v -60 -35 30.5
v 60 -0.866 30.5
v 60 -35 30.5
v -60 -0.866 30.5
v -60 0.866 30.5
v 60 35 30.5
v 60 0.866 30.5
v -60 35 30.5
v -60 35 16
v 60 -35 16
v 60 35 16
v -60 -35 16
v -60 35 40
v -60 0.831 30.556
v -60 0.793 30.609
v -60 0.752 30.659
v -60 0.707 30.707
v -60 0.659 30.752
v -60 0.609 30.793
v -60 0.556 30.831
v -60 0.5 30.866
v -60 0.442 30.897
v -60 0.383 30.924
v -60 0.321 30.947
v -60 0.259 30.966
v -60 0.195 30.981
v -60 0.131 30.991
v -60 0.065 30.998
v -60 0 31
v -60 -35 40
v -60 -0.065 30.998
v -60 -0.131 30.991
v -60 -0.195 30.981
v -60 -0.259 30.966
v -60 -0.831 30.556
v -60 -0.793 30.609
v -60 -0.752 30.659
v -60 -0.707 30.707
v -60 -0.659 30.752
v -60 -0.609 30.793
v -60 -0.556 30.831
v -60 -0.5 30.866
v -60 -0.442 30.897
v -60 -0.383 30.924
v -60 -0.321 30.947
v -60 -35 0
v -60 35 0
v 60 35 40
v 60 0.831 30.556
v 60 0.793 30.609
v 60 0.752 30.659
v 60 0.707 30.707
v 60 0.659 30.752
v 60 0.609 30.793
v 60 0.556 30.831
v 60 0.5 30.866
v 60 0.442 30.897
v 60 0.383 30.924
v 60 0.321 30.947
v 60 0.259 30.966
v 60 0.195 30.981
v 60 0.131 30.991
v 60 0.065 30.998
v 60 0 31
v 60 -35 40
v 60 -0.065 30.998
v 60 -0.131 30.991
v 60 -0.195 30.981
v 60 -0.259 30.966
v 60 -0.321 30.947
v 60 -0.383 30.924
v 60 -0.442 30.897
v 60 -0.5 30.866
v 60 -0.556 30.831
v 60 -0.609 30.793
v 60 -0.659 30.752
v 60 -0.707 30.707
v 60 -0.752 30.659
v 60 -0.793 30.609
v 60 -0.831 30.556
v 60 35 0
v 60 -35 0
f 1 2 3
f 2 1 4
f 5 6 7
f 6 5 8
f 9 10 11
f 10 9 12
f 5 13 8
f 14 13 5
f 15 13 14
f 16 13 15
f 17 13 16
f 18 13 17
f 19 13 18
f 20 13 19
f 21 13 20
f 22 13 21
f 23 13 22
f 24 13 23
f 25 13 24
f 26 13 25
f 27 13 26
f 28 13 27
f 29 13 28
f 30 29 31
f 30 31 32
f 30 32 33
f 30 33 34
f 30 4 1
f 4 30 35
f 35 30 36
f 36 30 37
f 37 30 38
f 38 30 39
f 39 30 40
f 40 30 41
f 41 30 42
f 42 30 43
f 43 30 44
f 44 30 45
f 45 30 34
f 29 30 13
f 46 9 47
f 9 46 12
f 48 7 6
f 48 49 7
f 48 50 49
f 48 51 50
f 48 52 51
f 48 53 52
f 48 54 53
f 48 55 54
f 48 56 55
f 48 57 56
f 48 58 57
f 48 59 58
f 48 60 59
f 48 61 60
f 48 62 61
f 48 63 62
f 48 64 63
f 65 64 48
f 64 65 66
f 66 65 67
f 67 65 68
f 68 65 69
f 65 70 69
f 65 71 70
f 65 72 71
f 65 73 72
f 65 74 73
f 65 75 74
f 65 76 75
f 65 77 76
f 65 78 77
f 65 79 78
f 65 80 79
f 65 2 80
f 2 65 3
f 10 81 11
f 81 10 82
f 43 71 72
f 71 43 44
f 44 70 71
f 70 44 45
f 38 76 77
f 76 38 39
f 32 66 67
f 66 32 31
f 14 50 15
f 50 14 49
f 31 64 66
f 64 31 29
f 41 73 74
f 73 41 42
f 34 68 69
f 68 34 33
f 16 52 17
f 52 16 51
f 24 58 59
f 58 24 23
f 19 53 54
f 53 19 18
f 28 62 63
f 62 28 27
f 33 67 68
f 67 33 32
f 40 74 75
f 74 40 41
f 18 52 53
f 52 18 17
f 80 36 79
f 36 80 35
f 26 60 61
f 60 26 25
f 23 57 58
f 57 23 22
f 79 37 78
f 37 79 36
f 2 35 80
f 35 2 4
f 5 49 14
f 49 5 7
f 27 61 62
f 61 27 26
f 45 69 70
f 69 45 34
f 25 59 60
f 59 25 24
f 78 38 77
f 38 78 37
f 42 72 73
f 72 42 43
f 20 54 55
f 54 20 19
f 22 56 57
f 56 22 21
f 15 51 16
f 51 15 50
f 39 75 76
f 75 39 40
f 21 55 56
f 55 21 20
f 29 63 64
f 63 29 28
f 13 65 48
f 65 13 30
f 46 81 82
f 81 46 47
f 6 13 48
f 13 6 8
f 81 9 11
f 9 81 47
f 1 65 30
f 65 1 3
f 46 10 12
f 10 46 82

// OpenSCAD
// Mini horizontal gel-electrophoresis box - buffer tank
// Print orientation: tank rests on XY plane at z = 0, builds upward (+Z)

// ---------------- Parameters ----------------
tank_x      = 120;   // outer length in X (mm)
tank_y      = 70;    // outer width in Y (mm)
tank_h      = 40;    // outer height in Z (mm)
wall        = 3;     // wall thickness (mm)
floor       = 3;     // floor thickness (mm)

platform_x  = 60;    // platform length in X (mm), centred
platform_y  = tank_y - 2 * wall;  // platform spans full inner width
platform_top = 13;   // platform top height above inner floor (mm) -> z = floor + platform_top

hole_d      = 2;     // electrode hole diameter (mm)
hole_y      = 0;     // electrode hole Y position (mm)
hole_z      = 30;    // electrode hole Z position (mm)

eps         = 0.5;   // cutter overshoot past faces (mm)
$fn         = 96;    // curve resolution

// ---------------- Derived ----------------
inner_floor_z = floor;
platform_z    = inner_floor_z + platform_top;
chamber_h     = hole_z - platform_z;  // height of buffer chambers above platform

// ---------------- Model ----------------
difference() {
    // Tank body: outer block with floor and walls, open top
    translate([-tank_x/2, -tank_y/2, 0])
        cube([tank_x, tank_y, tank_h]);

    // Cut out the two end buffer chambers above the platform
    for (sx = [-1, 1]) {
        x0 = sx < 0 ? -tank_x/2 : tank_x/2 - platform_x;
        x1 = x0 + platform_x - (sx < 0 ? platform_x : tank_x - platform_x);
        translate([x0, -tank_y/2 - eps, platform_z])
            cube([platform_x, tank_y + 2*eps, chamber_h + eps]);
    }

    // Horizontal electrode holes through each end wall, along X
    for (sx = [-1, 1]) {
        x = sx < 0 ? -tank_x/2 - eps : tank_x/2 + platform_x/2 - eps;
        translate([x, hole_y, hole_z])
            rotate([0, 90, 0])
                cylinder(d = hole_d, h = tank_x + 2*eps);
    }
}
